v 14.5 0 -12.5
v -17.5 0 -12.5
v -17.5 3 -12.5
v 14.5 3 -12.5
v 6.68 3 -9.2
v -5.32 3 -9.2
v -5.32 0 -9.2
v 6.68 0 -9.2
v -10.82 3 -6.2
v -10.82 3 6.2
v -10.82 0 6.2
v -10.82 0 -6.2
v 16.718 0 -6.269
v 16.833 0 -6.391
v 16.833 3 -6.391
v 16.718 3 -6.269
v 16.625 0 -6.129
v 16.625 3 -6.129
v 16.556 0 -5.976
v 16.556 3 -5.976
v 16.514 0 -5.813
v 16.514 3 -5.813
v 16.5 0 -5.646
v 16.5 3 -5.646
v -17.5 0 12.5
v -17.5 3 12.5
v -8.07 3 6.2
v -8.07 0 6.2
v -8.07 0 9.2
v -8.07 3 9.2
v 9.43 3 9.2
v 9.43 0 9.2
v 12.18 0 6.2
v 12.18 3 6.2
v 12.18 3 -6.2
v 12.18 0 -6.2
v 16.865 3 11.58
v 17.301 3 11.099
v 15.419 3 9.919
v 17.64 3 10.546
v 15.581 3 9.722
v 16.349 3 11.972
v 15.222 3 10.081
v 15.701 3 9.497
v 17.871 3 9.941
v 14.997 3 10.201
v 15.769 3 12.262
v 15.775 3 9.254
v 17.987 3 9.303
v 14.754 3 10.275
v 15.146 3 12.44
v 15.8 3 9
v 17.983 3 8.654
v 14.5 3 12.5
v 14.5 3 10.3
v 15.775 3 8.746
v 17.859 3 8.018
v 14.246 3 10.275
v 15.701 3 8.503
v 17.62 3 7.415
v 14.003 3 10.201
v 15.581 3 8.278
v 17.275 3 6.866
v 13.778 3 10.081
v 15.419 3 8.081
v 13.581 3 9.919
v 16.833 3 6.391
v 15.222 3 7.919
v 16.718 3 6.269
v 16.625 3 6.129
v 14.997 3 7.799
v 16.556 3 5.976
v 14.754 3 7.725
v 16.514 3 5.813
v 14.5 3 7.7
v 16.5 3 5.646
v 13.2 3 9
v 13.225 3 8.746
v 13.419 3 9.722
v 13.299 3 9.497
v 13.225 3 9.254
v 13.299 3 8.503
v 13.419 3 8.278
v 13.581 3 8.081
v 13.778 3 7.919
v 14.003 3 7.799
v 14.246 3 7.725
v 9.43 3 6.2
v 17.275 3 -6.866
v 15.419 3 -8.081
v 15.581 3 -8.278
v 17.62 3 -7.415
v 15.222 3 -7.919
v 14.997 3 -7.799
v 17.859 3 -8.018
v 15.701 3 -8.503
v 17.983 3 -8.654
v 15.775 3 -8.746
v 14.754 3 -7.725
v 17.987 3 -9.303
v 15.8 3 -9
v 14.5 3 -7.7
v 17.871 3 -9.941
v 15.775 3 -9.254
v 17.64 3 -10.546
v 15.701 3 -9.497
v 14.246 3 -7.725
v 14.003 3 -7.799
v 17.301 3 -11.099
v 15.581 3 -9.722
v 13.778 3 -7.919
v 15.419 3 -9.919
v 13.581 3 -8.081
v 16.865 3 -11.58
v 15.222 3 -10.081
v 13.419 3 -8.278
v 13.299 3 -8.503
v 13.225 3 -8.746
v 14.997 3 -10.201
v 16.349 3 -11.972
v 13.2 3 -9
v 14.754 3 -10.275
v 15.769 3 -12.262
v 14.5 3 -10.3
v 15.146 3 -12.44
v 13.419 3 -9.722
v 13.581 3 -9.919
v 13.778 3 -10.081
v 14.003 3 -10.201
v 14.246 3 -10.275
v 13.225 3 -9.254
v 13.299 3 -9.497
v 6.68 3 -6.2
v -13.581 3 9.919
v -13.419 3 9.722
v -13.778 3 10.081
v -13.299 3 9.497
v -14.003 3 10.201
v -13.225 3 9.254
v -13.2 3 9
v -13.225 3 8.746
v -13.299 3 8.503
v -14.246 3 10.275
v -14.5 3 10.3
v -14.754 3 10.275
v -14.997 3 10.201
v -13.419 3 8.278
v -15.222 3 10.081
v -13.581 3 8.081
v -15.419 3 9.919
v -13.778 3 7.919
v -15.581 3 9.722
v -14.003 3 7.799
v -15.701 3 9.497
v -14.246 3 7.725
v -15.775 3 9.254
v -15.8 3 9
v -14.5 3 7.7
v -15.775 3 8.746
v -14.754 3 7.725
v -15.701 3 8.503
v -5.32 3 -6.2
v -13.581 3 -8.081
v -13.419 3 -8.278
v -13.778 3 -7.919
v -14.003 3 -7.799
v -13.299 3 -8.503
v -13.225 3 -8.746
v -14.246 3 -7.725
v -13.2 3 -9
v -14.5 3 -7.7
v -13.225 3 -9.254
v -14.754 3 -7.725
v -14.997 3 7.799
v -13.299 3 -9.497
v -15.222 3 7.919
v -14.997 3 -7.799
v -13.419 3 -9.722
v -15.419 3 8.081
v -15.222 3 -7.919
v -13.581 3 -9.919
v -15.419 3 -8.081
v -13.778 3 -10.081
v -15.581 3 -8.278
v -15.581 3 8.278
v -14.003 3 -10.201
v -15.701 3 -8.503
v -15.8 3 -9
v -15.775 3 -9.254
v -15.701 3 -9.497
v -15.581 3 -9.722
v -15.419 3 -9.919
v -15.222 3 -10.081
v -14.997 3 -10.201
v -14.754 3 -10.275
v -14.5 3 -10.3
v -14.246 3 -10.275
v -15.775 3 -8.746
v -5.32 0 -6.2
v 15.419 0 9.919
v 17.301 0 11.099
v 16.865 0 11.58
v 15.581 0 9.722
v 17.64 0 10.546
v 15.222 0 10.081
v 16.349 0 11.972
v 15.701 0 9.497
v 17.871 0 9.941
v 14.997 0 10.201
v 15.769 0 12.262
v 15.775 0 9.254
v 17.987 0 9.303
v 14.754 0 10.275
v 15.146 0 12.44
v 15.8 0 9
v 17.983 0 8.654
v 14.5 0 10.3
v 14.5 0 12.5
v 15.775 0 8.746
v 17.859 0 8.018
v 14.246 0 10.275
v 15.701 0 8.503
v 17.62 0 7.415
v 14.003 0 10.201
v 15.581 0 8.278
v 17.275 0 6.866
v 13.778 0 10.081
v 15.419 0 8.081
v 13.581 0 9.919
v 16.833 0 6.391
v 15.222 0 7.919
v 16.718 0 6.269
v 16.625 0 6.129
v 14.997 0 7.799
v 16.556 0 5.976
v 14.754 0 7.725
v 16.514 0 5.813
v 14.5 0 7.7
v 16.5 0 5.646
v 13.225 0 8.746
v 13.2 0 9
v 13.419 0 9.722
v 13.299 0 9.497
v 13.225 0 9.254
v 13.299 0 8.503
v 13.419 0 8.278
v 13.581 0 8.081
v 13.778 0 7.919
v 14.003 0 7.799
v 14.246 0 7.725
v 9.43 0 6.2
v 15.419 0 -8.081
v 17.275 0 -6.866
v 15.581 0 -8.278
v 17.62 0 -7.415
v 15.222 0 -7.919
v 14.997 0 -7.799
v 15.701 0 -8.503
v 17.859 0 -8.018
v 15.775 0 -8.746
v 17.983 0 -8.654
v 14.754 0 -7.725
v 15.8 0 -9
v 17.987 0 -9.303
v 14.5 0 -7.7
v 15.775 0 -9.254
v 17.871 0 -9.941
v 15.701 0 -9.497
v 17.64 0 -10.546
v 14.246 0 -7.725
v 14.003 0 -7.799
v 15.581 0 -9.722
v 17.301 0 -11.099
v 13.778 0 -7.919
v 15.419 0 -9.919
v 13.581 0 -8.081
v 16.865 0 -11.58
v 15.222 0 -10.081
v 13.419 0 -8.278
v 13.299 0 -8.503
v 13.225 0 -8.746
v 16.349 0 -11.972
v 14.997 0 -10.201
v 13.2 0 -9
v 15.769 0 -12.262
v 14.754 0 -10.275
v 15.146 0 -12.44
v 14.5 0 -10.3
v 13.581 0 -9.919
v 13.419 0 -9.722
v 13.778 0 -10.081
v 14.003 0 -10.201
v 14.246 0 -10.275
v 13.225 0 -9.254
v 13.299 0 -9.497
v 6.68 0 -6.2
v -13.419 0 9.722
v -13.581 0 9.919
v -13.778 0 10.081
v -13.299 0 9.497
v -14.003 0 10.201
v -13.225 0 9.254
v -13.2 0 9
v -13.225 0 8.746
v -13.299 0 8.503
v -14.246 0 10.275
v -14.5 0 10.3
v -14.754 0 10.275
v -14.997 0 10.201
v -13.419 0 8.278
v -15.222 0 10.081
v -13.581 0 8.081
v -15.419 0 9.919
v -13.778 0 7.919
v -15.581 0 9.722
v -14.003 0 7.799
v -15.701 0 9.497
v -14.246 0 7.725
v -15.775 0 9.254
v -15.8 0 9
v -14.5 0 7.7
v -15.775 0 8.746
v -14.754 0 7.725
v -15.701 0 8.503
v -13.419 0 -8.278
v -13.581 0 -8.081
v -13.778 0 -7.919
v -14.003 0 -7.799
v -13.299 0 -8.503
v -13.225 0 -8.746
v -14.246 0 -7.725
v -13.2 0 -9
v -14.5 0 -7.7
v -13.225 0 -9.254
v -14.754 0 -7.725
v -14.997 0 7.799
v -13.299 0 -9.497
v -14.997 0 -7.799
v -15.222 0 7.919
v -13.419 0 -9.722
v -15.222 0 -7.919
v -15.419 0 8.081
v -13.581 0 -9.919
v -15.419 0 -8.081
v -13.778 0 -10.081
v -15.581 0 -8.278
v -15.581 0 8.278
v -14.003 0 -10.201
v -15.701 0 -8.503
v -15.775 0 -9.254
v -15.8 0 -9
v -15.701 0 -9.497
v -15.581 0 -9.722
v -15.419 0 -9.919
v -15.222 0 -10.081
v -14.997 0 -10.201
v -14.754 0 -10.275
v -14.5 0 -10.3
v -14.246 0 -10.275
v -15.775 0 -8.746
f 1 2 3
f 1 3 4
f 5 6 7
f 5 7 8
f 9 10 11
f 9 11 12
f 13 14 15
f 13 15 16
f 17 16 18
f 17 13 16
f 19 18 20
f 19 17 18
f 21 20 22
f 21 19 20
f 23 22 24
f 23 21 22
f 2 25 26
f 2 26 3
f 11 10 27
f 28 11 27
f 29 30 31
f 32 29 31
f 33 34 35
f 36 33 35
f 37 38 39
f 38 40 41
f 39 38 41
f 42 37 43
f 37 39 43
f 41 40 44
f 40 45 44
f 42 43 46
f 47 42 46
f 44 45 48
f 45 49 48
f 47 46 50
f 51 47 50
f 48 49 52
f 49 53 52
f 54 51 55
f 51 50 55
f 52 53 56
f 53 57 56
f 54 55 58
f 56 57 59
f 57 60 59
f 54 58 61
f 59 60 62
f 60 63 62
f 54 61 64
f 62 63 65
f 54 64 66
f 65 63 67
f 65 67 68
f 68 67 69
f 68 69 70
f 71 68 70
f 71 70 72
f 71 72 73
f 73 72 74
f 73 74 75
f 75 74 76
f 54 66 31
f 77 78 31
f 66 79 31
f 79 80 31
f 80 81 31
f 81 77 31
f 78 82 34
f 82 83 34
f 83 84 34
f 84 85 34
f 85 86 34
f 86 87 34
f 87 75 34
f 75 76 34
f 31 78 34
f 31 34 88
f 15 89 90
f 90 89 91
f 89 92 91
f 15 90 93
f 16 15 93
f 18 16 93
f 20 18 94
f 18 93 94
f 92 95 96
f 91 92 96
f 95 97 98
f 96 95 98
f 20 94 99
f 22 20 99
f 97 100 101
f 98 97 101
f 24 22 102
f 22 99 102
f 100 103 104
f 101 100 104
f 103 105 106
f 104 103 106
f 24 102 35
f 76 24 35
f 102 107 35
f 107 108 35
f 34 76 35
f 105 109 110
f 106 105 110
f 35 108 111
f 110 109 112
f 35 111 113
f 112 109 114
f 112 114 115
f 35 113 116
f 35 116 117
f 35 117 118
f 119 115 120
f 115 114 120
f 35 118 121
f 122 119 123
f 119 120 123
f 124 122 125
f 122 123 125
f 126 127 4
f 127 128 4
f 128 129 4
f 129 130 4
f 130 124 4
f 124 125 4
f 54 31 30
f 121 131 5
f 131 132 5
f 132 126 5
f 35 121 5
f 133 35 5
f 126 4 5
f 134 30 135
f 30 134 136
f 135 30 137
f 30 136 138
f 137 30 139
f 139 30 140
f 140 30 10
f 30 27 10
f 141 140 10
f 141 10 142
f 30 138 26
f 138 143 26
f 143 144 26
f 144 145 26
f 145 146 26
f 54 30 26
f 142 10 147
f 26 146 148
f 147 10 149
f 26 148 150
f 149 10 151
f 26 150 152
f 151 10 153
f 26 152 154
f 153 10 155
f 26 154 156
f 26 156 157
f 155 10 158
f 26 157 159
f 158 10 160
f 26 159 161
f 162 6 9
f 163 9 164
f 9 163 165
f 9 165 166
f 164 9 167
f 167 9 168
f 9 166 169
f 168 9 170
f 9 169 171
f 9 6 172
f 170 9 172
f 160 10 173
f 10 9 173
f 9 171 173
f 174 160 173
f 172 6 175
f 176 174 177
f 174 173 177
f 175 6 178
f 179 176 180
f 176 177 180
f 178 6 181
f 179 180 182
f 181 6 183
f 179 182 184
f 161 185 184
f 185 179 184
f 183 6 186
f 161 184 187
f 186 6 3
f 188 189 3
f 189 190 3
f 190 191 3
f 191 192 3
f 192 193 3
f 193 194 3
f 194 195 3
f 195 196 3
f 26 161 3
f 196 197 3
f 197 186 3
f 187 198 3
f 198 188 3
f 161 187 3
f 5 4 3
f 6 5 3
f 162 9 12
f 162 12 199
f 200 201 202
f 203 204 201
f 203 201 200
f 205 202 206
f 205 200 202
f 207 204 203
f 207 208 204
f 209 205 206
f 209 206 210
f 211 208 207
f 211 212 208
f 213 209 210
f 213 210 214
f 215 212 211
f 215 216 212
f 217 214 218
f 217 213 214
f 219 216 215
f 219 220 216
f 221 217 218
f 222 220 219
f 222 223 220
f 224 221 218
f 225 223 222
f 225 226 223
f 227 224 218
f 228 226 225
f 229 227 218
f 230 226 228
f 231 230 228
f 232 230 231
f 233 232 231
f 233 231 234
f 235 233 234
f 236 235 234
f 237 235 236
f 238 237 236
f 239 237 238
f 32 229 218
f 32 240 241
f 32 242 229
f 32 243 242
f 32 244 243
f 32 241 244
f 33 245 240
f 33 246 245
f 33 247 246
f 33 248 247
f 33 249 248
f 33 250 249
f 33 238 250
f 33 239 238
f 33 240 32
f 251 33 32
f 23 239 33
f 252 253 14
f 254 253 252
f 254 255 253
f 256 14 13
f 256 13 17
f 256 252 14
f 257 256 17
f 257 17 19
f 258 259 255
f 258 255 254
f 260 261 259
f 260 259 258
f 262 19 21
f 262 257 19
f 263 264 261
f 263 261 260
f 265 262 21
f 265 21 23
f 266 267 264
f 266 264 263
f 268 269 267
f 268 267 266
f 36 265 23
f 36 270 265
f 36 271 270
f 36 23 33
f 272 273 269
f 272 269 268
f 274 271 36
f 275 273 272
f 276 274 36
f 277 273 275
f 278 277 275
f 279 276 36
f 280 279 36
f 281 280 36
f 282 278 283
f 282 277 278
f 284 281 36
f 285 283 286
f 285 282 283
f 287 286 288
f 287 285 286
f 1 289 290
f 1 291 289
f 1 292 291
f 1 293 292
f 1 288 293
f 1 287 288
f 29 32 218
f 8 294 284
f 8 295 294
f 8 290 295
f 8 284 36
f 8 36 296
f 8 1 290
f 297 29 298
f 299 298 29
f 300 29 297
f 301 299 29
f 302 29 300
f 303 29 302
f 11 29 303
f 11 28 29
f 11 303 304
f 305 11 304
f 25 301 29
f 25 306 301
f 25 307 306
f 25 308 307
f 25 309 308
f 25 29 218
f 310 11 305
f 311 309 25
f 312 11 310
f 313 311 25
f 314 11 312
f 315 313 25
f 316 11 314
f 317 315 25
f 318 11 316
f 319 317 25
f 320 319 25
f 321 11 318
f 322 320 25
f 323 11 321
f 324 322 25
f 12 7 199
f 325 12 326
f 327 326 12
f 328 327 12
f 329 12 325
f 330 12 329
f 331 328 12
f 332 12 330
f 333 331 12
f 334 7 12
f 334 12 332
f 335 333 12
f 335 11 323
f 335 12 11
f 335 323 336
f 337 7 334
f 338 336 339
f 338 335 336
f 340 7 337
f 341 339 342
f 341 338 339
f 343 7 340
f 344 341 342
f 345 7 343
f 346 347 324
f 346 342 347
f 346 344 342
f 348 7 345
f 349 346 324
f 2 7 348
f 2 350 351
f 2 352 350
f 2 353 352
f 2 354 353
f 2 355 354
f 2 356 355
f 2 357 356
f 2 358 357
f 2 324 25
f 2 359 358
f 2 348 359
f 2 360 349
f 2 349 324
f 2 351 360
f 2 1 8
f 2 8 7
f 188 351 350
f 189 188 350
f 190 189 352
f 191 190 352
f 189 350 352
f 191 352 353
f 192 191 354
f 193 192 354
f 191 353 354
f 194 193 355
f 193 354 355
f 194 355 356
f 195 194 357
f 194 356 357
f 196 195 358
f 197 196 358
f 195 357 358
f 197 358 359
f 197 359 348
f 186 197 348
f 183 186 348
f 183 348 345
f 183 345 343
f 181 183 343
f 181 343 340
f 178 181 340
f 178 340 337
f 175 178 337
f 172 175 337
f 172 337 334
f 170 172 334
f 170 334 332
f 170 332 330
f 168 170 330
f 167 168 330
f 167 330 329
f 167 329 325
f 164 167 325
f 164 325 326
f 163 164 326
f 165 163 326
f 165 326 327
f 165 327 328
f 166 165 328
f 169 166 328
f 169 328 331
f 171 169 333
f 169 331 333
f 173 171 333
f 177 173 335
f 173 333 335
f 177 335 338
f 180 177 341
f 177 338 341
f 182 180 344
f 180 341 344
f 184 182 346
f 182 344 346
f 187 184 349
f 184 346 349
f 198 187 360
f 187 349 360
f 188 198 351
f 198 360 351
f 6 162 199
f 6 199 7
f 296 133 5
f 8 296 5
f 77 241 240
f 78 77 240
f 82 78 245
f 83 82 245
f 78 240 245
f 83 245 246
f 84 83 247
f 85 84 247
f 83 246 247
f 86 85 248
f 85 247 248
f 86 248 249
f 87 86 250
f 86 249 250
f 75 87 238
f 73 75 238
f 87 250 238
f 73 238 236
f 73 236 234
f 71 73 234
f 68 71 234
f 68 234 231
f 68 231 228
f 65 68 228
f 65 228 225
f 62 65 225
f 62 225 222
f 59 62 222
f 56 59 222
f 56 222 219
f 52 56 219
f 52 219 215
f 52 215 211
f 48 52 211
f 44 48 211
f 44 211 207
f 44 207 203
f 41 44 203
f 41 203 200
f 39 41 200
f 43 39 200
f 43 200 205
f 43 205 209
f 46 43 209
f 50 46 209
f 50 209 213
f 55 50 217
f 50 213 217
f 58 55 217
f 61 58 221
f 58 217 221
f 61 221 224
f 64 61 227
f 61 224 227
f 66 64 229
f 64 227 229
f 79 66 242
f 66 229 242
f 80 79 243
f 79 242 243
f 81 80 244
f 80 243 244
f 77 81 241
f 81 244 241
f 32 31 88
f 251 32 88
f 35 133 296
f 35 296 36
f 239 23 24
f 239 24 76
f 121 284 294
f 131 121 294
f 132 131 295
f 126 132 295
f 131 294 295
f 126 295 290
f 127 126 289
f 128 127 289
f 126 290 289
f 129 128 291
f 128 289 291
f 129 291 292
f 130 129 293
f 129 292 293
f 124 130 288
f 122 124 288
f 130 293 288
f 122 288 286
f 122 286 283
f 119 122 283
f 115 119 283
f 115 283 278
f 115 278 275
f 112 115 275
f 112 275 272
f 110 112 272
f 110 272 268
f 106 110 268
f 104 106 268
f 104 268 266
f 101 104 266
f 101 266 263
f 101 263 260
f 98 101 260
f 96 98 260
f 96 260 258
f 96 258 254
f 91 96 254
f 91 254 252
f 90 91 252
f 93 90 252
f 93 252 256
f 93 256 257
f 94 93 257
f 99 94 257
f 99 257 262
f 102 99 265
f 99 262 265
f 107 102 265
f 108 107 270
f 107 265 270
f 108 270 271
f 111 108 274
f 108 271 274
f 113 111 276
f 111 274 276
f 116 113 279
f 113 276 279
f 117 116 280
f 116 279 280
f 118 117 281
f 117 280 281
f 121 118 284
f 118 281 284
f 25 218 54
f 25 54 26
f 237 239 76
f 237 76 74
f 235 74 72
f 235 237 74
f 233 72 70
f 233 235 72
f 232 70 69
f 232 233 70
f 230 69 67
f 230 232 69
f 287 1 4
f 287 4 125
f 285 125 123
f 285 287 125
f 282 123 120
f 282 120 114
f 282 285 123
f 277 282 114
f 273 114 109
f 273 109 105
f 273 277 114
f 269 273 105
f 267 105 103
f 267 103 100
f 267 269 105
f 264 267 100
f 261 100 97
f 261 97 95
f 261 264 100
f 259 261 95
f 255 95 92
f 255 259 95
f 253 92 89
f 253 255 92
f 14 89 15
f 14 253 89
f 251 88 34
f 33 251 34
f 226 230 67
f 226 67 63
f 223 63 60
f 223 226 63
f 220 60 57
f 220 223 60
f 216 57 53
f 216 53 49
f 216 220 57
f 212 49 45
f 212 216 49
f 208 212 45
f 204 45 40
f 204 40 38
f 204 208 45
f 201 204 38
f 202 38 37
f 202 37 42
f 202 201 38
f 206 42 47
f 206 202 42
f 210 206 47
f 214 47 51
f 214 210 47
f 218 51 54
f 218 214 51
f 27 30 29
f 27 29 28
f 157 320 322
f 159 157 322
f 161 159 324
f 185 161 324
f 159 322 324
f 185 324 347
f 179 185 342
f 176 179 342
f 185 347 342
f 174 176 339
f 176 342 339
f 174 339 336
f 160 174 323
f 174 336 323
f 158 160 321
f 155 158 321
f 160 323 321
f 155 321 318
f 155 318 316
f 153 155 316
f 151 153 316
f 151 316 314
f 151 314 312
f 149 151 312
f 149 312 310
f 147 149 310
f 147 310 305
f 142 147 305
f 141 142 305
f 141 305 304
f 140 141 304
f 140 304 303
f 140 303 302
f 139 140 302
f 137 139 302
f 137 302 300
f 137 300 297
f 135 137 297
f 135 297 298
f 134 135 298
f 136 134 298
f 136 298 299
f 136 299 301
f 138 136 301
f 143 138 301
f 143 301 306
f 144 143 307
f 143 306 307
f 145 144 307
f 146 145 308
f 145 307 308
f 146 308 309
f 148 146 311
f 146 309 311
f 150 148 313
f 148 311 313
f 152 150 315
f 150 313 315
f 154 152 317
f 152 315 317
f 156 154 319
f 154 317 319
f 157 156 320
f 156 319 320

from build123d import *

# Parameters (mm, degrees)
RESSALTO_EXTRUS_O1_DEPTH     = 3
PERFIL_CORTE_W               = 23
PERFIL_CORTE_H               = 12.4
CORTE_PRINCIPAL_DEPTH        = 112.01996056
ESBO_O7_W                    = 12
ESBO_O7_H                    = 3
ESBO_O7_W_2                  = 17.5
CORTE_EXTRUS_O3_DEPTH        = 70.828040064
FURO_DE_DI_METRO_2_6_2_6_1_D = 2.6


with BuildPart() as part:
    # Base Perfil → Ressalto-extrusão1 (new body)
    with BuildSketch(Plane(origin=(0, 0, 0), x_dir=(1, 0, 0), z_dir=(0, 1, 0))):
        with BuildLine():
            Line((-17.5, 12.5), (14.5, 12.5))
            ThreePointArc((14.5, 12.5), (17.769603256, 10.248877314), (16.833333333, 6.391254026))
            ThreePointArc((16.833333333, 6.391254026), (16.587129071, 6.054146324), (16.5, 5.645898034))
            Line((16.5, 5.645898034), (16.5, -5.645898034))
            ThreePointArc((16.5, -5.645898034), (16.587129071, -6.054146324), (16.833333333, -6.391254026))
            ThreePointArc((16.833333333, -6.391254026), (17.769603256, -10.248877314), (14.5, -12.5))
            Line((14.5, -12.5), (-17.5, -12.5))
            Line((-17.5, -12.5), (-17.5, 12.5))
        make_face()
    extrude(amount=RESSALTO_EXTRUS_O1_DEPTH)

    # Perfil Corte → Corte Principal (cut, through all)
    with BuildSketch(Plane(origin=(-89.30915689, 3, 15.805061213), x_dir=(1, 0, 0), z_dir=(0, 1, 0))):
        with Locations((89.98915689, 15.805061213)):
            Rectangle(PERFIL_CORTE_W, PERFIL_CORTE_H)
    extrude(amount=-CORTE_PRINCIPAL_DEPTH, mode=Mode.SUBTRACT)

    # Esboço7 → Corte-extrusão3 (cut, through all)
    with BuildSketch(Plane(origin=(-37.630551407, 3, 29.597469394), x_dir=(1, 0, 0), z_dir=(0, 1, 0))):
        with Locations((38.310551407, 37.297469394)):
            Rectangle(ESBO_O7_W, ESBO_O7_H)
        with Locations((38.310551407, 21.897469394)):
            Rectangle(ESBO_O7_W_2, ESBO_O7_H)
    extrude(amount=-CORTE_EXTRUS_O3_DEPTH, mode=Mode.SUBTRACT)

    # Furo de diâmetro Ø2.6 (2.6)1 (through all)
    with Locations(Plane(origin=(0, 3, 0), x_dir=(1, 0, 0), z_dir=(0, 1, 0))):
        with Locations((-14.5, 9), (-14.5, -9), (14.5, 9), (14.5, -9)):
            Hole(FURO_DE_DI_METRO_2_6_2_6_1_D / 2)


solid = part.part
